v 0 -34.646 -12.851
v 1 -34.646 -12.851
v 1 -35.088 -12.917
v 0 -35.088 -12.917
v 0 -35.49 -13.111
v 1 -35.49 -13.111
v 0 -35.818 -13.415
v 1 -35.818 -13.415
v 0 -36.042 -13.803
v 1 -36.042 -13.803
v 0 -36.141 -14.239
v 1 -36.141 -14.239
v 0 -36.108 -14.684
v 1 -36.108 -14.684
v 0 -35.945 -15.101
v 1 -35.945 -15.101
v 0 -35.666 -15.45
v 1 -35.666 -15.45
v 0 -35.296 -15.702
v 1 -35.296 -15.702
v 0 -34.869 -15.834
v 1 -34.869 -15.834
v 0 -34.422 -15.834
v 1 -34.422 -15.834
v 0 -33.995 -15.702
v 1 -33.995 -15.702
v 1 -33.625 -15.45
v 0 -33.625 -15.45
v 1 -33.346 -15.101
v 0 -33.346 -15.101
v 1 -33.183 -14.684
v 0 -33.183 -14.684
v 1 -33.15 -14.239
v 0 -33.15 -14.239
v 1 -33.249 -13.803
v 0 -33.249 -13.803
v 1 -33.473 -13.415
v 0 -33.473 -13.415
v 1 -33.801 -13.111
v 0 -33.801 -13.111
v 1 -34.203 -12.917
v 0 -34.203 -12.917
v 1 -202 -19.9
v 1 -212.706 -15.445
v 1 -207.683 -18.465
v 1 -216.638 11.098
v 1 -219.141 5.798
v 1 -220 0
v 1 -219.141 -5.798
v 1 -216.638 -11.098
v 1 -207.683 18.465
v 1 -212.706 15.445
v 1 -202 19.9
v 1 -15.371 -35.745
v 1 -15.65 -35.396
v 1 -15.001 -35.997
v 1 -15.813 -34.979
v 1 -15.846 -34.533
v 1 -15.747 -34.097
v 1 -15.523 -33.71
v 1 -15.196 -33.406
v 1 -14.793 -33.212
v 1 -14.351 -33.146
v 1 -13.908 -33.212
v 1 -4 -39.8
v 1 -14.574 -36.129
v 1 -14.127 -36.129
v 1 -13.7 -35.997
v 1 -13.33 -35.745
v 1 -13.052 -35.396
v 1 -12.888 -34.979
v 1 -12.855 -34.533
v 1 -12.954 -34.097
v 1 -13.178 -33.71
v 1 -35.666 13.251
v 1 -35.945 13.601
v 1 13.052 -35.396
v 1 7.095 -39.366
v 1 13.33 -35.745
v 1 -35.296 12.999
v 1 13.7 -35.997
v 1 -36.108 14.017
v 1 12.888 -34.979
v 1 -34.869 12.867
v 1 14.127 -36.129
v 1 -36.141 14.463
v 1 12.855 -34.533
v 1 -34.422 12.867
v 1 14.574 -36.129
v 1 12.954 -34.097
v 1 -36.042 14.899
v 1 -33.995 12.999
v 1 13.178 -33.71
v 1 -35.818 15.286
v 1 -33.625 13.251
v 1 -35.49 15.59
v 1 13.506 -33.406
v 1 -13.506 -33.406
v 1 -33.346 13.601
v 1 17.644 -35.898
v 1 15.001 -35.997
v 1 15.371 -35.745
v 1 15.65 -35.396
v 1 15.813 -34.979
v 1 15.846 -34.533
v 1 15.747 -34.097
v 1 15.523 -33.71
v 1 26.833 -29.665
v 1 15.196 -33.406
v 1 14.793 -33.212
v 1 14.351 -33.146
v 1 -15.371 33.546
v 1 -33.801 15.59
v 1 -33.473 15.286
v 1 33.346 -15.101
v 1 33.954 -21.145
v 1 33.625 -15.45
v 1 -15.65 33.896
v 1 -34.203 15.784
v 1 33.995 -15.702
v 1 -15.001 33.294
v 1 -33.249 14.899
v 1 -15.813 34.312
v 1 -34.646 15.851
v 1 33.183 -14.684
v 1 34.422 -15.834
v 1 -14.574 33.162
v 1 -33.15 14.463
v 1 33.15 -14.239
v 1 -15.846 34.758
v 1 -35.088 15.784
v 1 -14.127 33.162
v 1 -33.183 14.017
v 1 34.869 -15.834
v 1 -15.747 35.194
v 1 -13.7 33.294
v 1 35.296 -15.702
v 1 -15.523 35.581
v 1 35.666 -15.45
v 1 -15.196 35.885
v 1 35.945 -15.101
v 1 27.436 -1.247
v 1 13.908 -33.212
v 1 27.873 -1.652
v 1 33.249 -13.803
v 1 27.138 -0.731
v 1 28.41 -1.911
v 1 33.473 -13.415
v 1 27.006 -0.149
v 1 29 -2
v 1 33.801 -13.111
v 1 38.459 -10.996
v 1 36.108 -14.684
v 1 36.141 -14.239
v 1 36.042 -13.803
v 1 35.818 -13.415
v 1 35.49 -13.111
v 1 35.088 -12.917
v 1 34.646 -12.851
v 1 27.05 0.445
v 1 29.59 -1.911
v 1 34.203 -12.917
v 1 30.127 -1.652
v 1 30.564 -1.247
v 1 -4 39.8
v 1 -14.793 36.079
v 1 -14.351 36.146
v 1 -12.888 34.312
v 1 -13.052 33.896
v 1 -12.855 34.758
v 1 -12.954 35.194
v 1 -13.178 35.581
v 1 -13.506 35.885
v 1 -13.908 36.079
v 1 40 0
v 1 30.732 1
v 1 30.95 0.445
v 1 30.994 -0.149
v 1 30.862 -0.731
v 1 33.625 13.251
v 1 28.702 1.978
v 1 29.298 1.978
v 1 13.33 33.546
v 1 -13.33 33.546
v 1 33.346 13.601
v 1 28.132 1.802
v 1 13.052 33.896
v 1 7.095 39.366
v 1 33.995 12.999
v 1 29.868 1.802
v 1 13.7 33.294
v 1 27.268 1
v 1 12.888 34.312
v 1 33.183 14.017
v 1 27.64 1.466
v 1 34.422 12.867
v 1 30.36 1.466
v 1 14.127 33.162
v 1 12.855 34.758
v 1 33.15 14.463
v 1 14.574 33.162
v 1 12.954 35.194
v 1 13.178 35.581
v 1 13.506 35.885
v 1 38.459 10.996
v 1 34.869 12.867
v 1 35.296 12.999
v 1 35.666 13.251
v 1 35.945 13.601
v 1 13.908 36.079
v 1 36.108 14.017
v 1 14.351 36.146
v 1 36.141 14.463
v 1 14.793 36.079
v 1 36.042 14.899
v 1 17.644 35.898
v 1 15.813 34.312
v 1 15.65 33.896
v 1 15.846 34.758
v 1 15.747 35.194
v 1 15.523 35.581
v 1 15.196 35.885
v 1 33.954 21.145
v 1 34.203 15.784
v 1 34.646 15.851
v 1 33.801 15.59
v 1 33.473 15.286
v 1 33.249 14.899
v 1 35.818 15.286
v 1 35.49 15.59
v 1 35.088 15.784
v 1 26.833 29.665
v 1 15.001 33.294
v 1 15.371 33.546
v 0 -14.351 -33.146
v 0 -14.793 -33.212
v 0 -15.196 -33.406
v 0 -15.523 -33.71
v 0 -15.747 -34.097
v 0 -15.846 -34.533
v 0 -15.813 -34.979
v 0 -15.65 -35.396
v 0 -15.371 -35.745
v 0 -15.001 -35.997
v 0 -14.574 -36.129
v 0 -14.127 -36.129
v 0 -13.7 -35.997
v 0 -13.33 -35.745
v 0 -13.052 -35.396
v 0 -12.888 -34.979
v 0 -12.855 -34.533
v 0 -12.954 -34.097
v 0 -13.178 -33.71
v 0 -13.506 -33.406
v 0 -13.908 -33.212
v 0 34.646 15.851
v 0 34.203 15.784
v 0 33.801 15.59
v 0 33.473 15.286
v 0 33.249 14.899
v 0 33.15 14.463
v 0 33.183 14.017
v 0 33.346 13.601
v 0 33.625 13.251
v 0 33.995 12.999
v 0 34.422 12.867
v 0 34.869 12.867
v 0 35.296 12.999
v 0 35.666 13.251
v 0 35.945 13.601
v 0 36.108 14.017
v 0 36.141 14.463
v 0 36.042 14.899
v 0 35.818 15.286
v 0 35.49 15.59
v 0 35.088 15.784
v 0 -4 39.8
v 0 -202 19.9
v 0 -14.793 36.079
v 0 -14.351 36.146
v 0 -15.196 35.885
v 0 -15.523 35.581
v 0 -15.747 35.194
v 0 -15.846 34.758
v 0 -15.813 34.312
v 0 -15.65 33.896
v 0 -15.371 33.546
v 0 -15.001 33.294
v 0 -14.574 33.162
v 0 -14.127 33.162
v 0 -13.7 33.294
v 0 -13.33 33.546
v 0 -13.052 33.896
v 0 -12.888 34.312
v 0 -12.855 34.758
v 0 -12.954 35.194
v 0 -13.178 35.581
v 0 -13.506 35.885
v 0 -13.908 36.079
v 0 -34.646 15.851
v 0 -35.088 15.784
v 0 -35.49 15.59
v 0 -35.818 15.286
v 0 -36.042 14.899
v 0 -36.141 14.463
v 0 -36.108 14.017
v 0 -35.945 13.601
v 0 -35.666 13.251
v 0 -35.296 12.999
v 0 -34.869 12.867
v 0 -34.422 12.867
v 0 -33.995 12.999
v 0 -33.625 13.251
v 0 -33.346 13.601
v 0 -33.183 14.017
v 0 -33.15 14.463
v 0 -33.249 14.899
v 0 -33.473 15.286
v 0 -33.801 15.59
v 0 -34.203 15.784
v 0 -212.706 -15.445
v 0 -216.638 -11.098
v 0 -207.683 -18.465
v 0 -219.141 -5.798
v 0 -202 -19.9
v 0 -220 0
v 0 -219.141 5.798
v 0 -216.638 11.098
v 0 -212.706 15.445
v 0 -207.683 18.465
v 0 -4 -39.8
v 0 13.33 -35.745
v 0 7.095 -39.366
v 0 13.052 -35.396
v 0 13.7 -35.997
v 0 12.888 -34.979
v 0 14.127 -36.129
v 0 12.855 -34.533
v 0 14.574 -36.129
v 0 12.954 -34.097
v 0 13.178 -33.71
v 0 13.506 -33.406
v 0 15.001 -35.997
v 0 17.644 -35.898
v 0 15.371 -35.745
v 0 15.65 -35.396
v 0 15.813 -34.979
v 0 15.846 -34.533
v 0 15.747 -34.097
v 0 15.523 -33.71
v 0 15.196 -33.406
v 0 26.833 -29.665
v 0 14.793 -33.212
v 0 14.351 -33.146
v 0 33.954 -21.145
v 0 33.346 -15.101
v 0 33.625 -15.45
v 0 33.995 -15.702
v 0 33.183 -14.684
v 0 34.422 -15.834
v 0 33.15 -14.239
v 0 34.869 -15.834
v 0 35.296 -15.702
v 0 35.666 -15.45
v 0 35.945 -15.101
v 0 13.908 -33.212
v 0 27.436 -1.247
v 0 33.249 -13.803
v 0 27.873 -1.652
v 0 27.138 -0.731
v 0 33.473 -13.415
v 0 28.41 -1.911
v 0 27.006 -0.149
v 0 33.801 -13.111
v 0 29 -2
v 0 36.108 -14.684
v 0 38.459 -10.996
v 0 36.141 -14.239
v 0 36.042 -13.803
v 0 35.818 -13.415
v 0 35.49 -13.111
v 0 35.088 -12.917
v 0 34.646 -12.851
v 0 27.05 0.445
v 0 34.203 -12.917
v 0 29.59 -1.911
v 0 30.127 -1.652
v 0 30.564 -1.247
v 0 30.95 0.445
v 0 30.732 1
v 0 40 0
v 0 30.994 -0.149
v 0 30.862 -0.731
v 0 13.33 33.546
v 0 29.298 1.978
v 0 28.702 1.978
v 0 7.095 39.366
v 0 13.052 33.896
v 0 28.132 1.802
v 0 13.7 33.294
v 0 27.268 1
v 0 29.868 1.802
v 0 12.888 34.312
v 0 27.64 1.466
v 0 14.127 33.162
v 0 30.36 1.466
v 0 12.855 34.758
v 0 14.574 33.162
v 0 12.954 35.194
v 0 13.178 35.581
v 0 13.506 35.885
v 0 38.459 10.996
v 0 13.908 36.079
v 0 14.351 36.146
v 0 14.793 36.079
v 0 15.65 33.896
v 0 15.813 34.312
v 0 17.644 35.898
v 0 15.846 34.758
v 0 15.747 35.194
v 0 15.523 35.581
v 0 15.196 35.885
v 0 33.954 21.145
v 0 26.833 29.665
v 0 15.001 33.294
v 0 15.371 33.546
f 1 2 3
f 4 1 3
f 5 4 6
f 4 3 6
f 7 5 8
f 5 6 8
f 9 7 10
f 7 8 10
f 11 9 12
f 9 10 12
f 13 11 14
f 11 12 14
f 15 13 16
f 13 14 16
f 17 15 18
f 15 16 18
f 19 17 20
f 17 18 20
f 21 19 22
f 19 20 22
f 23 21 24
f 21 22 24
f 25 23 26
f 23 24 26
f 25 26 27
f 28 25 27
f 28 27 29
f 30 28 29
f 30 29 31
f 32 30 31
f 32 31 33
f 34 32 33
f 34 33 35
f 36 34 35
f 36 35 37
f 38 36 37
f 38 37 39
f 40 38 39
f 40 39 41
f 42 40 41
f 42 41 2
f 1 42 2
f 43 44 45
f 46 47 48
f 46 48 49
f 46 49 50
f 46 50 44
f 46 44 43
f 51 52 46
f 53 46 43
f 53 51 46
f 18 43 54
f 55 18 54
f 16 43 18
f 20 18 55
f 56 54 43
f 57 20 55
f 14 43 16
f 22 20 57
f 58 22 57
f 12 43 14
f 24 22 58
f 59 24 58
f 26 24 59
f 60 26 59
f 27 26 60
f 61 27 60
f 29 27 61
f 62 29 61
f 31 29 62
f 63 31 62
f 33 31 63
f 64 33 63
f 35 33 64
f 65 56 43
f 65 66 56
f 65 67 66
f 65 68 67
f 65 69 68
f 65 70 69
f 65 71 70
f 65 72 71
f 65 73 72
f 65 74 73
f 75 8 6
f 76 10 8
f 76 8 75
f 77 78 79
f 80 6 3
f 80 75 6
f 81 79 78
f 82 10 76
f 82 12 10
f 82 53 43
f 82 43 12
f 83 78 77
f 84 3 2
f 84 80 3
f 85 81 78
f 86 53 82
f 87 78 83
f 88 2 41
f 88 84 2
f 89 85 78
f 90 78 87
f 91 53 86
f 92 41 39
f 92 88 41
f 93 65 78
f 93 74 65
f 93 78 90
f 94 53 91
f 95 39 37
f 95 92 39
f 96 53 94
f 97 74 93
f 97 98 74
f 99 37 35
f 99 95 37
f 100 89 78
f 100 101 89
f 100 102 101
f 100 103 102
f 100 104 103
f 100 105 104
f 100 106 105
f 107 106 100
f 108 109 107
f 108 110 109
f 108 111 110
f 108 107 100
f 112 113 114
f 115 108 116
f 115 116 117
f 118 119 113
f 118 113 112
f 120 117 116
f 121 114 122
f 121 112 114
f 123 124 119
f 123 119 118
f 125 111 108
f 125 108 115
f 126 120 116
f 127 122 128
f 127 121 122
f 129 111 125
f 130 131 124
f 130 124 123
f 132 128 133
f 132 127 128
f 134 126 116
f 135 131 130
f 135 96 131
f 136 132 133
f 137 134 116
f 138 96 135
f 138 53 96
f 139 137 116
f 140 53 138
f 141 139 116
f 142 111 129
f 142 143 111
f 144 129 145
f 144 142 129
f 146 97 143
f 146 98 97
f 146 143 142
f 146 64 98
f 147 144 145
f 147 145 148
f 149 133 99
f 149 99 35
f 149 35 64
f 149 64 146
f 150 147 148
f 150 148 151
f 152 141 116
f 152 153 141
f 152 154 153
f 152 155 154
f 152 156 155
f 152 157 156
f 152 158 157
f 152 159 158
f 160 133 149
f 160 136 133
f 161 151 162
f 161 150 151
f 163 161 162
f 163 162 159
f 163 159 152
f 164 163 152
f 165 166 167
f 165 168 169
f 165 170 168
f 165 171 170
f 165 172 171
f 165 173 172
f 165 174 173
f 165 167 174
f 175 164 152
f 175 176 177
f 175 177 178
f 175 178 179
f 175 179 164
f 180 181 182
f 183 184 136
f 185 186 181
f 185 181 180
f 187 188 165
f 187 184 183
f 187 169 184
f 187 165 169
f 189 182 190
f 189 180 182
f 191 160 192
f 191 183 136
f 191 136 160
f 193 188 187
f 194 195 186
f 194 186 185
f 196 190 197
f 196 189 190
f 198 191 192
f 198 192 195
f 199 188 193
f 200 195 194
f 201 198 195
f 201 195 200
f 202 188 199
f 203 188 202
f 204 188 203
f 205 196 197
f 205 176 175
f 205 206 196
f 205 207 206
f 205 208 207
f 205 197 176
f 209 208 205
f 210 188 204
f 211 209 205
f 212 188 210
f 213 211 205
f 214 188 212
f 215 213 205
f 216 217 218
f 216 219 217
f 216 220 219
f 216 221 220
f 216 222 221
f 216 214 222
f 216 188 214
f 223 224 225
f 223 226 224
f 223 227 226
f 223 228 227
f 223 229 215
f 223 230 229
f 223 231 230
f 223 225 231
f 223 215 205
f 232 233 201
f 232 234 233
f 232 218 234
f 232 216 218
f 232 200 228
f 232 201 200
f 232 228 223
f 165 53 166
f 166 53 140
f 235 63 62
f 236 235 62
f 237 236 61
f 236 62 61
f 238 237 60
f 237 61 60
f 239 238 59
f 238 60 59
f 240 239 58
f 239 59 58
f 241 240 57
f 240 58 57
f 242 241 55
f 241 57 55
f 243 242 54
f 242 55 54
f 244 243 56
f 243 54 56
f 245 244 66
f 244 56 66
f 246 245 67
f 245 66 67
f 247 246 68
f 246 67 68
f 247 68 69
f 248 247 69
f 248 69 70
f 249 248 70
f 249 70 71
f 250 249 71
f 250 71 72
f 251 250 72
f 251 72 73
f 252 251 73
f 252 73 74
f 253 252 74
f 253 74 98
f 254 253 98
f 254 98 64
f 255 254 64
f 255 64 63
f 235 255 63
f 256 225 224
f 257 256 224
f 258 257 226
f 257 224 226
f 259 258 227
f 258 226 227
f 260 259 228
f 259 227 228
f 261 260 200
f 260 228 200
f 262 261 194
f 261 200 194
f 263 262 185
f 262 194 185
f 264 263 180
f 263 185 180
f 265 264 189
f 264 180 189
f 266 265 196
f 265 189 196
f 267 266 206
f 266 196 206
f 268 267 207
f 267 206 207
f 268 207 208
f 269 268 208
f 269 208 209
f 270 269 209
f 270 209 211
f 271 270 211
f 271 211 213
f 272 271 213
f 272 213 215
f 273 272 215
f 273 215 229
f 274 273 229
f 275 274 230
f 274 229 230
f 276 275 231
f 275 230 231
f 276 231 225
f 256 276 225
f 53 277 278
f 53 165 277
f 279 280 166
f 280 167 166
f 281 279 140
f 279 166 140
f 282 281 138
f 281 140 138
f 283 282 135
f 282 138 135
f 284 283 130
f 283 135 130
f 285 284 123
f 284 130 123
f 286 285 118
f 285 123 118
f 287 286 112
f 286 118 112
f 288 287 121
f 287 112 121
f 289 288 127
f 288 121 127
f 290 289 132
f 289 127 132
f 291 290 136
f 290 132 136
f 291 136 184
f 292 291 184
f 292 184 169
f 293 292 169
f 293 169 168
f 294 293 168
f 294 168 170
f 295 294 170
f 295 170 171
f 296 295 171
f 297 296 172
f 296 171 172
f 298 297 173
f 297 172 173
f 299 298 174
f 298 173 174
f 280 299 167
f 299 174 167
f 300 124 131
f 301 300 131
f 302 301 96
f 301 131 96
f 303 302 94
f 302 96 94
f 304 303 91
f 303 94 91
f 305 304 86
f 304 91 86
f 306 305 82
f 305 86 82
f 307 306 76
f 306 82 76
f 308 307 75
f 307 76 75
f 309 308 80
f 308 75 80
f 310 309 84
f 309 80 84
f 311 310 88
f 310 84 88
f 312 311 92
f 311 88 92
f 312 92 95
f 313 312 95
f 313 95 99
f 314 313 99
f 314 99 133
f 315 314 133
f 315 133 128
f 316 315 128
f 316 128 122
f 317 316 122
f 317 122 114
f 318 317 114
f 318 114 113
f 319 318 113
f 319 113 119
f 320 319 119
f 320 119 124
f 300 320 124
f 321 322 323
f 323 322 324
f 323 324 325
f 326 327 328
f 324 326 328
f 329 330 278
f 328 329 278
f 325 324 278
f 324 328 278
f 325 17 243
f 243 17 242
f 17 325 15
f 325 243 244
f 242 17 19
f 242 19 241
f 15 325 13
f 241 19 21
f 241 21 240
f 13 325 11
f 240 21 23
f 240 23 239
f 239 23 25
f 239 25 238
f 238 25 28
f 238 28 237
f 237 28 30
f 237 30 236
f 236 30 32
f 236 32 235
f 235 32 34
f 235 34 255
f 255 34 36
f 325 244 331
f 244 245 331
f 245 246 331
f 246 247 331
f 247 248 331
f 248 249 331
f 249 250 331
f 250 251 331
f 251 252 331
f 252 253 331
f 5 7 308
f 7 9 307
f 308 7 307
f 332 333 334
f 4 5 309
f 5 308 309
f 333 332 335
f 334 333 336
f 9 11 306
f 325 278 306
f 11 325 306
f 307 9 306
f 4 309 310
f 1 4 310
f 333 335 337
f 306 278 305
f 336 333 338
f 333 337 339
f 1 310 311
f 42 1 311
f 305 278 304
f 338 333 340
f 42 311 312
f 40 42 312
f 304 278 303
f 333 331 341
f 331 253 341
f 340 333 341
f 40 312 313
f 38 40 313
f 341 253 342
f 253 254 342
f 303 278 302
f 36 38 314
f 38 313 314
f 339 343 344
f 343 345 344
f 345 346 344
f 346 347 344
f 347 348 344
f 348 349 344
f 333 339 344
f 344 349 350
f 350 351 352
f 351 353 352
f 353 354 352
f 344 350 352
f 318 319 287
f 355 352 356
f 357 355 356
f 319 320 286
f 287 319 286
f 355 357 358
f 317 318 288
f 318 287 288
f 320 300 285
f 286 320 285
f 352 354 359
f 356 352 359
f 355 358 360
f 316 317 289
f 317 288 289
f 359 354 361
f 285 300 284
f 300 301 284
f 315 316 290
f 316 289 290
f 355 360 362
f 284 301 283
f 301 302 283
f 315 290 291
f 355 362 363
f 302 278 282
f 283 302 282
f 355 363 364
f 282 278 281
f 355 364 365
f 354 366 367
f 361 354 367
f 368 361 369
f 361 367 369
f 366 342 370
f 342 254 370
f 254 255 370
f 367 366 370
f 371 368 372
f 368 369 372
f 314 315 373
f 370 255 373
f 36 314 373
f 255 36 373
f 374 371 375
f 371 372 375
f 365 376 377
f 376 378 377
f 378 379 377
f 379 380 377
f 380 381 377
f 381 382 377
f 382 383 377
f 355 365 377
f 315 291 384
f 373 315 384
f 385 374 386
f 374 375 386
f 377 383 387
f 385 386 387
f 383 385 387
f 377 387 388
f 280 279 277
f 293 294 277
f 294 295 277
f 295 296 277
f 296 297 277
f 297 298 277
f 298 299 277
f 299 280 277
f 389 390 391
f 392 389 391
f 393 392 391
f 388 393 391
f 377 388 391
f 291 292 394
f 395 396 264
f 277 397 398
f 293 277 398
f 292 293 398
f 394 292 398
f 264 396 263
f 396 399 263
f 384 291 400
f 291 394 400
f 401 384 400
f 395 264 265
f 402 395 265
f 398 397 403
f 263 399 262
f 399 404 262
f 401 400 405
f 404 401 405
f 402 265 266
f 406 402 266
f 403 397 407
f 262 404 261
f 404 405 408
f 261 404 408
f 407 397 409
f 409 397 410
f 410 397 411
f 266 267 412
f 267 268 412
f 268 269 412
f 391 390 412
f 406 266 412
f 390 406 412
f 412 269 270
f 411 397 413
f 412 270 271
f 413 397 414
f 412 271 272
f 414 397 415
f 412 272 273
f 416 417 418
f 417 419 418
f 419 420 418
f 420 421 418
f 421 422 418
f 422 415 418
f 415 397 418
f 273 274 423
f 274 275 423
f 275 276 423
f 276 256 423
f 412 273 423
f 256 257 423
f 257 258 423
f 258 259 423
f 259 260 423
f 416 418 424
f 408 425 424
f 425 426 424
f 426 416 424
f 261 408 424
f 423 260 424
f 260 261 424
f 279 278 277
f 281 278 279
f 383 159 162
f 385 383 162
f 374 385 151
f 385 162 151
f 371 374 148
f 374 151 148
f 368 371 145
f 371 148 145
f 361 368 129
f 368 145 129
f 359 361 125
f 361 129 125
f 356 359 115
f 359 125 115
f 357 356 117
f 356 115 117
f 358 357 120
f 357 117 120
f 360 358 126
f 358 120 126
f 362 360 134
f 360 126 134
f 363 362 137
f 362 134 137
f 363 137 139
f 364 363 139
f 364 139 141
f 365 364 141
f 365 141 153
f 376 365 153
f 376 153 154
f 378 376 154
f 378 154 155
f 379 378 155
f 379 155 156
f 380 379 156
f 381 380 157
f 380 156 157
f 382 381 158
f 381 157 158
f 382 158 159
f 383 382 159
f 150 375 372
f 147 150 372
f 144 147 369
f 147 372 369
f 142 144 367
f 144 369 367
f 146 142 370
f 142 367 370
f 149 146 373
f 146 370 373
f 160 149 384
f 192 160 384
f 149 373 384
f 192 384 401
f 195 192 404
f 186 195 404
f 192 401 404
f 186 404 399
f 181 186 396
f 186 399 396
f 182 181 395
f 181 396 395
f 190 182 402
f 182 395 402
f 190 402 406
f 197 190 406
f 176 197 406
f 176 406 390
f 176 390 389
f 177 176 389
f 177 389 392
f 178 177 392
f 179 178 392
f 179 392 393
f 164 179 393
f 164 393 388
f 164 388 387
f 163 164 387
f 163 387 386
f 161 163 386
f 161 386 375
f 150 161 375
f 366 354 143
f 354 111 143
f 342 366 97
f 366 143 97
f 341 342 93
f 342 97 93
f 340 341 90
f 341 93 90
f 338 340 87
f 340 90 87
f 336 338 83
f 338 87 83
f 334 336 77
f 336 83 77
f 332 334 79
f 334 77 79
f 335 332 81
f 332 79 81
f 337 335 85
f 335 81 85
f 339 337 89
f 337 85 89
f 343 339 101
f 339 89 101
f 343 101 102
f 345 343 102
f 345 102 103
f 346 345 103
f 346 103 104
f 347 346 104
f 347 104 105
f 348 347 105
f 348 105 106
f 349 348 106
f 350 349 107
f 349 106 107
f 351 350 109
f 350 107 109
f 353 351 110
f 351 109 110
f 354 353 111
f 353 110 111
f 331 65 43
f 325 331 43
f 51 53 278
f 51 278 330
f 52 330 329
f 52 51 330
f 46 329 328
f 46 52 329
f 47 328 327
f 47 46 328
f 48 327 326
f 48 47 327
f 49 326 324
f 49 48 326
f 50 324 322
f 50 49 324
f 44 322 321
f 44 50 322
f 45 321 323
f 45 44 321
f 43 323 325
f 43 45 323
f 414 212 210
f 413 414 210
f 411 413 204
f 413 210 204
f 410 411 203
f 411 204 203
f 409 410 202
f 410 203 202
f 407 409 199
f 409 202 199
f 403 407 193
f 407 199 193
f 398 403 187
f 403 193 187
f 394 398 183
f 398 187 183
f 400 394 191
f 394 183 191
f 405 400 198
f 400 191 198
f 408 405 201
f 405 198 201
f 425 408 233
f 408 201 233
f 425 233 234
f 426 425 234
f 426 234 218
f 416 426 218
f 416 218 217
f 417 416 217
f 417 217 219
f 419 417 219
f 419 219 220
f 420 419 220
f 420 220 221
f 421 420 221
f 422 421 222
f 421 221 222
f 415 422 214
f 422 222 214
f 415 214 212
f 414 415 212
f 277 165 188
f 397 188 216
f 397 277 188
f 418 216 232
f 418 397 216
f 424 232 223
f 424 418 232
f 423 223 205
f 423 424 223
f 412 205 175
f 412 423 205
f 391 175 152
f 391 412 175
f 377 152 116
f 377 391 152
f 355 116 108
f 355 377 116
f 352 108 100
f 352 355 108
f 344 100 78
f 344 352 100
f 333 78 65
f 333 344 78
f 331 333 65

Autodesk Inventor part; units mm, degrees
ref_plane "YZ Plane" through (0, 0, 0) normal (1, 0, 0) x (0, 1, 0)
ref_plane "XZ Plane" through (0, 0, 0) normal (0, 1, 0) x (-1, 0, 0)
ref_plane "XY Plane" through (0, 0, 0) normal (0, 0, 1) x (1, 0, 0)
sketch "スケッチ1" plane through (0, 0, 0) normal (1, 0, 0) x (0, 1, 0)
  circle A0 centre (0, 0) radius 40
  dimension "d0" = 80
extrude "押し出し1" add sketch "スケッチ1" along normal blind 1
sketch "スケッチ2" plane through (1, 0, 0) normal (1, 0, 0) x (0, 0, -1)
  point P0 (0, 0)
  point P1 (0, 29)
  dimension "d3" = 29
hole "穴1" at (1, 29, 0) direction (-1, 0, 0) diameter 4 end through all
sketch "スケッチ4" plane through (1, 0, 0) normal (1, 0, 0) x (0, 0, -1)
  circle A0 centre (0, -200) radius 20
  circle A1 centre (0, 0) radius 40 projected
  line L0 (-39.7995, -4) -> (-19.8997, -202)
  line L1 (39.7995, -4) -> (19.8997, -202)
  circle A2 centre (0, 0) radius 40 projected
  dimension "d13" = 40
  dimension "d14" = 200
extrude "押し出し2" add sketch "スケッチ4" against normal blind 1 contours A0 | A0 L0 A1 L1
sketch "スケッチ5" plane through (0, 0, 0) normal (-1, 0, 0) x (0, 0, 1)
  line L0 (-14.3506, 34.6455) -> (14.3506, 34.6455)
  line L1 (14.3506, 34.6455) -> (34.6455, 14.3506)
  line L2 (34.6455, 14.3506) -> (34.6455, -14.3506)
  line L3 (34.6455, -14.3506) -> (14.3506, -34.6455)
  line L4 (14.3506, -34.6455) -> (-14.3506, -34.6455)
  line L5 (-14.3506, -34.6455) -> (-34.6455, -14.3506)
  line L6 (-34.6455, -14.3506) -> (-34.6455, 14.3506)
  line L7 (-34.6455, 14.3506) -> (-14.3506, 34.6455)
  circle A0 centre (0, 29) radius 2 projected
  line L8 (0, 0) -> (0, 29)
  dimension "d17" = 37.5
hole "穴2" at (0, 34.6455, -14.3506) at (0, 14.3506, -34.6455) at (0, -14.3506, -34.6455) at (0, -34.6455, -14.3506) at (0, -34.6455, 14.3506) at (0, -14.3506, 34.6455) at (0, 14.3506, 34.6455) at (0, 34.6455, 14.3506) direction (1, 0, 0) diameter 3 end through all
properties part number "main_plate"
